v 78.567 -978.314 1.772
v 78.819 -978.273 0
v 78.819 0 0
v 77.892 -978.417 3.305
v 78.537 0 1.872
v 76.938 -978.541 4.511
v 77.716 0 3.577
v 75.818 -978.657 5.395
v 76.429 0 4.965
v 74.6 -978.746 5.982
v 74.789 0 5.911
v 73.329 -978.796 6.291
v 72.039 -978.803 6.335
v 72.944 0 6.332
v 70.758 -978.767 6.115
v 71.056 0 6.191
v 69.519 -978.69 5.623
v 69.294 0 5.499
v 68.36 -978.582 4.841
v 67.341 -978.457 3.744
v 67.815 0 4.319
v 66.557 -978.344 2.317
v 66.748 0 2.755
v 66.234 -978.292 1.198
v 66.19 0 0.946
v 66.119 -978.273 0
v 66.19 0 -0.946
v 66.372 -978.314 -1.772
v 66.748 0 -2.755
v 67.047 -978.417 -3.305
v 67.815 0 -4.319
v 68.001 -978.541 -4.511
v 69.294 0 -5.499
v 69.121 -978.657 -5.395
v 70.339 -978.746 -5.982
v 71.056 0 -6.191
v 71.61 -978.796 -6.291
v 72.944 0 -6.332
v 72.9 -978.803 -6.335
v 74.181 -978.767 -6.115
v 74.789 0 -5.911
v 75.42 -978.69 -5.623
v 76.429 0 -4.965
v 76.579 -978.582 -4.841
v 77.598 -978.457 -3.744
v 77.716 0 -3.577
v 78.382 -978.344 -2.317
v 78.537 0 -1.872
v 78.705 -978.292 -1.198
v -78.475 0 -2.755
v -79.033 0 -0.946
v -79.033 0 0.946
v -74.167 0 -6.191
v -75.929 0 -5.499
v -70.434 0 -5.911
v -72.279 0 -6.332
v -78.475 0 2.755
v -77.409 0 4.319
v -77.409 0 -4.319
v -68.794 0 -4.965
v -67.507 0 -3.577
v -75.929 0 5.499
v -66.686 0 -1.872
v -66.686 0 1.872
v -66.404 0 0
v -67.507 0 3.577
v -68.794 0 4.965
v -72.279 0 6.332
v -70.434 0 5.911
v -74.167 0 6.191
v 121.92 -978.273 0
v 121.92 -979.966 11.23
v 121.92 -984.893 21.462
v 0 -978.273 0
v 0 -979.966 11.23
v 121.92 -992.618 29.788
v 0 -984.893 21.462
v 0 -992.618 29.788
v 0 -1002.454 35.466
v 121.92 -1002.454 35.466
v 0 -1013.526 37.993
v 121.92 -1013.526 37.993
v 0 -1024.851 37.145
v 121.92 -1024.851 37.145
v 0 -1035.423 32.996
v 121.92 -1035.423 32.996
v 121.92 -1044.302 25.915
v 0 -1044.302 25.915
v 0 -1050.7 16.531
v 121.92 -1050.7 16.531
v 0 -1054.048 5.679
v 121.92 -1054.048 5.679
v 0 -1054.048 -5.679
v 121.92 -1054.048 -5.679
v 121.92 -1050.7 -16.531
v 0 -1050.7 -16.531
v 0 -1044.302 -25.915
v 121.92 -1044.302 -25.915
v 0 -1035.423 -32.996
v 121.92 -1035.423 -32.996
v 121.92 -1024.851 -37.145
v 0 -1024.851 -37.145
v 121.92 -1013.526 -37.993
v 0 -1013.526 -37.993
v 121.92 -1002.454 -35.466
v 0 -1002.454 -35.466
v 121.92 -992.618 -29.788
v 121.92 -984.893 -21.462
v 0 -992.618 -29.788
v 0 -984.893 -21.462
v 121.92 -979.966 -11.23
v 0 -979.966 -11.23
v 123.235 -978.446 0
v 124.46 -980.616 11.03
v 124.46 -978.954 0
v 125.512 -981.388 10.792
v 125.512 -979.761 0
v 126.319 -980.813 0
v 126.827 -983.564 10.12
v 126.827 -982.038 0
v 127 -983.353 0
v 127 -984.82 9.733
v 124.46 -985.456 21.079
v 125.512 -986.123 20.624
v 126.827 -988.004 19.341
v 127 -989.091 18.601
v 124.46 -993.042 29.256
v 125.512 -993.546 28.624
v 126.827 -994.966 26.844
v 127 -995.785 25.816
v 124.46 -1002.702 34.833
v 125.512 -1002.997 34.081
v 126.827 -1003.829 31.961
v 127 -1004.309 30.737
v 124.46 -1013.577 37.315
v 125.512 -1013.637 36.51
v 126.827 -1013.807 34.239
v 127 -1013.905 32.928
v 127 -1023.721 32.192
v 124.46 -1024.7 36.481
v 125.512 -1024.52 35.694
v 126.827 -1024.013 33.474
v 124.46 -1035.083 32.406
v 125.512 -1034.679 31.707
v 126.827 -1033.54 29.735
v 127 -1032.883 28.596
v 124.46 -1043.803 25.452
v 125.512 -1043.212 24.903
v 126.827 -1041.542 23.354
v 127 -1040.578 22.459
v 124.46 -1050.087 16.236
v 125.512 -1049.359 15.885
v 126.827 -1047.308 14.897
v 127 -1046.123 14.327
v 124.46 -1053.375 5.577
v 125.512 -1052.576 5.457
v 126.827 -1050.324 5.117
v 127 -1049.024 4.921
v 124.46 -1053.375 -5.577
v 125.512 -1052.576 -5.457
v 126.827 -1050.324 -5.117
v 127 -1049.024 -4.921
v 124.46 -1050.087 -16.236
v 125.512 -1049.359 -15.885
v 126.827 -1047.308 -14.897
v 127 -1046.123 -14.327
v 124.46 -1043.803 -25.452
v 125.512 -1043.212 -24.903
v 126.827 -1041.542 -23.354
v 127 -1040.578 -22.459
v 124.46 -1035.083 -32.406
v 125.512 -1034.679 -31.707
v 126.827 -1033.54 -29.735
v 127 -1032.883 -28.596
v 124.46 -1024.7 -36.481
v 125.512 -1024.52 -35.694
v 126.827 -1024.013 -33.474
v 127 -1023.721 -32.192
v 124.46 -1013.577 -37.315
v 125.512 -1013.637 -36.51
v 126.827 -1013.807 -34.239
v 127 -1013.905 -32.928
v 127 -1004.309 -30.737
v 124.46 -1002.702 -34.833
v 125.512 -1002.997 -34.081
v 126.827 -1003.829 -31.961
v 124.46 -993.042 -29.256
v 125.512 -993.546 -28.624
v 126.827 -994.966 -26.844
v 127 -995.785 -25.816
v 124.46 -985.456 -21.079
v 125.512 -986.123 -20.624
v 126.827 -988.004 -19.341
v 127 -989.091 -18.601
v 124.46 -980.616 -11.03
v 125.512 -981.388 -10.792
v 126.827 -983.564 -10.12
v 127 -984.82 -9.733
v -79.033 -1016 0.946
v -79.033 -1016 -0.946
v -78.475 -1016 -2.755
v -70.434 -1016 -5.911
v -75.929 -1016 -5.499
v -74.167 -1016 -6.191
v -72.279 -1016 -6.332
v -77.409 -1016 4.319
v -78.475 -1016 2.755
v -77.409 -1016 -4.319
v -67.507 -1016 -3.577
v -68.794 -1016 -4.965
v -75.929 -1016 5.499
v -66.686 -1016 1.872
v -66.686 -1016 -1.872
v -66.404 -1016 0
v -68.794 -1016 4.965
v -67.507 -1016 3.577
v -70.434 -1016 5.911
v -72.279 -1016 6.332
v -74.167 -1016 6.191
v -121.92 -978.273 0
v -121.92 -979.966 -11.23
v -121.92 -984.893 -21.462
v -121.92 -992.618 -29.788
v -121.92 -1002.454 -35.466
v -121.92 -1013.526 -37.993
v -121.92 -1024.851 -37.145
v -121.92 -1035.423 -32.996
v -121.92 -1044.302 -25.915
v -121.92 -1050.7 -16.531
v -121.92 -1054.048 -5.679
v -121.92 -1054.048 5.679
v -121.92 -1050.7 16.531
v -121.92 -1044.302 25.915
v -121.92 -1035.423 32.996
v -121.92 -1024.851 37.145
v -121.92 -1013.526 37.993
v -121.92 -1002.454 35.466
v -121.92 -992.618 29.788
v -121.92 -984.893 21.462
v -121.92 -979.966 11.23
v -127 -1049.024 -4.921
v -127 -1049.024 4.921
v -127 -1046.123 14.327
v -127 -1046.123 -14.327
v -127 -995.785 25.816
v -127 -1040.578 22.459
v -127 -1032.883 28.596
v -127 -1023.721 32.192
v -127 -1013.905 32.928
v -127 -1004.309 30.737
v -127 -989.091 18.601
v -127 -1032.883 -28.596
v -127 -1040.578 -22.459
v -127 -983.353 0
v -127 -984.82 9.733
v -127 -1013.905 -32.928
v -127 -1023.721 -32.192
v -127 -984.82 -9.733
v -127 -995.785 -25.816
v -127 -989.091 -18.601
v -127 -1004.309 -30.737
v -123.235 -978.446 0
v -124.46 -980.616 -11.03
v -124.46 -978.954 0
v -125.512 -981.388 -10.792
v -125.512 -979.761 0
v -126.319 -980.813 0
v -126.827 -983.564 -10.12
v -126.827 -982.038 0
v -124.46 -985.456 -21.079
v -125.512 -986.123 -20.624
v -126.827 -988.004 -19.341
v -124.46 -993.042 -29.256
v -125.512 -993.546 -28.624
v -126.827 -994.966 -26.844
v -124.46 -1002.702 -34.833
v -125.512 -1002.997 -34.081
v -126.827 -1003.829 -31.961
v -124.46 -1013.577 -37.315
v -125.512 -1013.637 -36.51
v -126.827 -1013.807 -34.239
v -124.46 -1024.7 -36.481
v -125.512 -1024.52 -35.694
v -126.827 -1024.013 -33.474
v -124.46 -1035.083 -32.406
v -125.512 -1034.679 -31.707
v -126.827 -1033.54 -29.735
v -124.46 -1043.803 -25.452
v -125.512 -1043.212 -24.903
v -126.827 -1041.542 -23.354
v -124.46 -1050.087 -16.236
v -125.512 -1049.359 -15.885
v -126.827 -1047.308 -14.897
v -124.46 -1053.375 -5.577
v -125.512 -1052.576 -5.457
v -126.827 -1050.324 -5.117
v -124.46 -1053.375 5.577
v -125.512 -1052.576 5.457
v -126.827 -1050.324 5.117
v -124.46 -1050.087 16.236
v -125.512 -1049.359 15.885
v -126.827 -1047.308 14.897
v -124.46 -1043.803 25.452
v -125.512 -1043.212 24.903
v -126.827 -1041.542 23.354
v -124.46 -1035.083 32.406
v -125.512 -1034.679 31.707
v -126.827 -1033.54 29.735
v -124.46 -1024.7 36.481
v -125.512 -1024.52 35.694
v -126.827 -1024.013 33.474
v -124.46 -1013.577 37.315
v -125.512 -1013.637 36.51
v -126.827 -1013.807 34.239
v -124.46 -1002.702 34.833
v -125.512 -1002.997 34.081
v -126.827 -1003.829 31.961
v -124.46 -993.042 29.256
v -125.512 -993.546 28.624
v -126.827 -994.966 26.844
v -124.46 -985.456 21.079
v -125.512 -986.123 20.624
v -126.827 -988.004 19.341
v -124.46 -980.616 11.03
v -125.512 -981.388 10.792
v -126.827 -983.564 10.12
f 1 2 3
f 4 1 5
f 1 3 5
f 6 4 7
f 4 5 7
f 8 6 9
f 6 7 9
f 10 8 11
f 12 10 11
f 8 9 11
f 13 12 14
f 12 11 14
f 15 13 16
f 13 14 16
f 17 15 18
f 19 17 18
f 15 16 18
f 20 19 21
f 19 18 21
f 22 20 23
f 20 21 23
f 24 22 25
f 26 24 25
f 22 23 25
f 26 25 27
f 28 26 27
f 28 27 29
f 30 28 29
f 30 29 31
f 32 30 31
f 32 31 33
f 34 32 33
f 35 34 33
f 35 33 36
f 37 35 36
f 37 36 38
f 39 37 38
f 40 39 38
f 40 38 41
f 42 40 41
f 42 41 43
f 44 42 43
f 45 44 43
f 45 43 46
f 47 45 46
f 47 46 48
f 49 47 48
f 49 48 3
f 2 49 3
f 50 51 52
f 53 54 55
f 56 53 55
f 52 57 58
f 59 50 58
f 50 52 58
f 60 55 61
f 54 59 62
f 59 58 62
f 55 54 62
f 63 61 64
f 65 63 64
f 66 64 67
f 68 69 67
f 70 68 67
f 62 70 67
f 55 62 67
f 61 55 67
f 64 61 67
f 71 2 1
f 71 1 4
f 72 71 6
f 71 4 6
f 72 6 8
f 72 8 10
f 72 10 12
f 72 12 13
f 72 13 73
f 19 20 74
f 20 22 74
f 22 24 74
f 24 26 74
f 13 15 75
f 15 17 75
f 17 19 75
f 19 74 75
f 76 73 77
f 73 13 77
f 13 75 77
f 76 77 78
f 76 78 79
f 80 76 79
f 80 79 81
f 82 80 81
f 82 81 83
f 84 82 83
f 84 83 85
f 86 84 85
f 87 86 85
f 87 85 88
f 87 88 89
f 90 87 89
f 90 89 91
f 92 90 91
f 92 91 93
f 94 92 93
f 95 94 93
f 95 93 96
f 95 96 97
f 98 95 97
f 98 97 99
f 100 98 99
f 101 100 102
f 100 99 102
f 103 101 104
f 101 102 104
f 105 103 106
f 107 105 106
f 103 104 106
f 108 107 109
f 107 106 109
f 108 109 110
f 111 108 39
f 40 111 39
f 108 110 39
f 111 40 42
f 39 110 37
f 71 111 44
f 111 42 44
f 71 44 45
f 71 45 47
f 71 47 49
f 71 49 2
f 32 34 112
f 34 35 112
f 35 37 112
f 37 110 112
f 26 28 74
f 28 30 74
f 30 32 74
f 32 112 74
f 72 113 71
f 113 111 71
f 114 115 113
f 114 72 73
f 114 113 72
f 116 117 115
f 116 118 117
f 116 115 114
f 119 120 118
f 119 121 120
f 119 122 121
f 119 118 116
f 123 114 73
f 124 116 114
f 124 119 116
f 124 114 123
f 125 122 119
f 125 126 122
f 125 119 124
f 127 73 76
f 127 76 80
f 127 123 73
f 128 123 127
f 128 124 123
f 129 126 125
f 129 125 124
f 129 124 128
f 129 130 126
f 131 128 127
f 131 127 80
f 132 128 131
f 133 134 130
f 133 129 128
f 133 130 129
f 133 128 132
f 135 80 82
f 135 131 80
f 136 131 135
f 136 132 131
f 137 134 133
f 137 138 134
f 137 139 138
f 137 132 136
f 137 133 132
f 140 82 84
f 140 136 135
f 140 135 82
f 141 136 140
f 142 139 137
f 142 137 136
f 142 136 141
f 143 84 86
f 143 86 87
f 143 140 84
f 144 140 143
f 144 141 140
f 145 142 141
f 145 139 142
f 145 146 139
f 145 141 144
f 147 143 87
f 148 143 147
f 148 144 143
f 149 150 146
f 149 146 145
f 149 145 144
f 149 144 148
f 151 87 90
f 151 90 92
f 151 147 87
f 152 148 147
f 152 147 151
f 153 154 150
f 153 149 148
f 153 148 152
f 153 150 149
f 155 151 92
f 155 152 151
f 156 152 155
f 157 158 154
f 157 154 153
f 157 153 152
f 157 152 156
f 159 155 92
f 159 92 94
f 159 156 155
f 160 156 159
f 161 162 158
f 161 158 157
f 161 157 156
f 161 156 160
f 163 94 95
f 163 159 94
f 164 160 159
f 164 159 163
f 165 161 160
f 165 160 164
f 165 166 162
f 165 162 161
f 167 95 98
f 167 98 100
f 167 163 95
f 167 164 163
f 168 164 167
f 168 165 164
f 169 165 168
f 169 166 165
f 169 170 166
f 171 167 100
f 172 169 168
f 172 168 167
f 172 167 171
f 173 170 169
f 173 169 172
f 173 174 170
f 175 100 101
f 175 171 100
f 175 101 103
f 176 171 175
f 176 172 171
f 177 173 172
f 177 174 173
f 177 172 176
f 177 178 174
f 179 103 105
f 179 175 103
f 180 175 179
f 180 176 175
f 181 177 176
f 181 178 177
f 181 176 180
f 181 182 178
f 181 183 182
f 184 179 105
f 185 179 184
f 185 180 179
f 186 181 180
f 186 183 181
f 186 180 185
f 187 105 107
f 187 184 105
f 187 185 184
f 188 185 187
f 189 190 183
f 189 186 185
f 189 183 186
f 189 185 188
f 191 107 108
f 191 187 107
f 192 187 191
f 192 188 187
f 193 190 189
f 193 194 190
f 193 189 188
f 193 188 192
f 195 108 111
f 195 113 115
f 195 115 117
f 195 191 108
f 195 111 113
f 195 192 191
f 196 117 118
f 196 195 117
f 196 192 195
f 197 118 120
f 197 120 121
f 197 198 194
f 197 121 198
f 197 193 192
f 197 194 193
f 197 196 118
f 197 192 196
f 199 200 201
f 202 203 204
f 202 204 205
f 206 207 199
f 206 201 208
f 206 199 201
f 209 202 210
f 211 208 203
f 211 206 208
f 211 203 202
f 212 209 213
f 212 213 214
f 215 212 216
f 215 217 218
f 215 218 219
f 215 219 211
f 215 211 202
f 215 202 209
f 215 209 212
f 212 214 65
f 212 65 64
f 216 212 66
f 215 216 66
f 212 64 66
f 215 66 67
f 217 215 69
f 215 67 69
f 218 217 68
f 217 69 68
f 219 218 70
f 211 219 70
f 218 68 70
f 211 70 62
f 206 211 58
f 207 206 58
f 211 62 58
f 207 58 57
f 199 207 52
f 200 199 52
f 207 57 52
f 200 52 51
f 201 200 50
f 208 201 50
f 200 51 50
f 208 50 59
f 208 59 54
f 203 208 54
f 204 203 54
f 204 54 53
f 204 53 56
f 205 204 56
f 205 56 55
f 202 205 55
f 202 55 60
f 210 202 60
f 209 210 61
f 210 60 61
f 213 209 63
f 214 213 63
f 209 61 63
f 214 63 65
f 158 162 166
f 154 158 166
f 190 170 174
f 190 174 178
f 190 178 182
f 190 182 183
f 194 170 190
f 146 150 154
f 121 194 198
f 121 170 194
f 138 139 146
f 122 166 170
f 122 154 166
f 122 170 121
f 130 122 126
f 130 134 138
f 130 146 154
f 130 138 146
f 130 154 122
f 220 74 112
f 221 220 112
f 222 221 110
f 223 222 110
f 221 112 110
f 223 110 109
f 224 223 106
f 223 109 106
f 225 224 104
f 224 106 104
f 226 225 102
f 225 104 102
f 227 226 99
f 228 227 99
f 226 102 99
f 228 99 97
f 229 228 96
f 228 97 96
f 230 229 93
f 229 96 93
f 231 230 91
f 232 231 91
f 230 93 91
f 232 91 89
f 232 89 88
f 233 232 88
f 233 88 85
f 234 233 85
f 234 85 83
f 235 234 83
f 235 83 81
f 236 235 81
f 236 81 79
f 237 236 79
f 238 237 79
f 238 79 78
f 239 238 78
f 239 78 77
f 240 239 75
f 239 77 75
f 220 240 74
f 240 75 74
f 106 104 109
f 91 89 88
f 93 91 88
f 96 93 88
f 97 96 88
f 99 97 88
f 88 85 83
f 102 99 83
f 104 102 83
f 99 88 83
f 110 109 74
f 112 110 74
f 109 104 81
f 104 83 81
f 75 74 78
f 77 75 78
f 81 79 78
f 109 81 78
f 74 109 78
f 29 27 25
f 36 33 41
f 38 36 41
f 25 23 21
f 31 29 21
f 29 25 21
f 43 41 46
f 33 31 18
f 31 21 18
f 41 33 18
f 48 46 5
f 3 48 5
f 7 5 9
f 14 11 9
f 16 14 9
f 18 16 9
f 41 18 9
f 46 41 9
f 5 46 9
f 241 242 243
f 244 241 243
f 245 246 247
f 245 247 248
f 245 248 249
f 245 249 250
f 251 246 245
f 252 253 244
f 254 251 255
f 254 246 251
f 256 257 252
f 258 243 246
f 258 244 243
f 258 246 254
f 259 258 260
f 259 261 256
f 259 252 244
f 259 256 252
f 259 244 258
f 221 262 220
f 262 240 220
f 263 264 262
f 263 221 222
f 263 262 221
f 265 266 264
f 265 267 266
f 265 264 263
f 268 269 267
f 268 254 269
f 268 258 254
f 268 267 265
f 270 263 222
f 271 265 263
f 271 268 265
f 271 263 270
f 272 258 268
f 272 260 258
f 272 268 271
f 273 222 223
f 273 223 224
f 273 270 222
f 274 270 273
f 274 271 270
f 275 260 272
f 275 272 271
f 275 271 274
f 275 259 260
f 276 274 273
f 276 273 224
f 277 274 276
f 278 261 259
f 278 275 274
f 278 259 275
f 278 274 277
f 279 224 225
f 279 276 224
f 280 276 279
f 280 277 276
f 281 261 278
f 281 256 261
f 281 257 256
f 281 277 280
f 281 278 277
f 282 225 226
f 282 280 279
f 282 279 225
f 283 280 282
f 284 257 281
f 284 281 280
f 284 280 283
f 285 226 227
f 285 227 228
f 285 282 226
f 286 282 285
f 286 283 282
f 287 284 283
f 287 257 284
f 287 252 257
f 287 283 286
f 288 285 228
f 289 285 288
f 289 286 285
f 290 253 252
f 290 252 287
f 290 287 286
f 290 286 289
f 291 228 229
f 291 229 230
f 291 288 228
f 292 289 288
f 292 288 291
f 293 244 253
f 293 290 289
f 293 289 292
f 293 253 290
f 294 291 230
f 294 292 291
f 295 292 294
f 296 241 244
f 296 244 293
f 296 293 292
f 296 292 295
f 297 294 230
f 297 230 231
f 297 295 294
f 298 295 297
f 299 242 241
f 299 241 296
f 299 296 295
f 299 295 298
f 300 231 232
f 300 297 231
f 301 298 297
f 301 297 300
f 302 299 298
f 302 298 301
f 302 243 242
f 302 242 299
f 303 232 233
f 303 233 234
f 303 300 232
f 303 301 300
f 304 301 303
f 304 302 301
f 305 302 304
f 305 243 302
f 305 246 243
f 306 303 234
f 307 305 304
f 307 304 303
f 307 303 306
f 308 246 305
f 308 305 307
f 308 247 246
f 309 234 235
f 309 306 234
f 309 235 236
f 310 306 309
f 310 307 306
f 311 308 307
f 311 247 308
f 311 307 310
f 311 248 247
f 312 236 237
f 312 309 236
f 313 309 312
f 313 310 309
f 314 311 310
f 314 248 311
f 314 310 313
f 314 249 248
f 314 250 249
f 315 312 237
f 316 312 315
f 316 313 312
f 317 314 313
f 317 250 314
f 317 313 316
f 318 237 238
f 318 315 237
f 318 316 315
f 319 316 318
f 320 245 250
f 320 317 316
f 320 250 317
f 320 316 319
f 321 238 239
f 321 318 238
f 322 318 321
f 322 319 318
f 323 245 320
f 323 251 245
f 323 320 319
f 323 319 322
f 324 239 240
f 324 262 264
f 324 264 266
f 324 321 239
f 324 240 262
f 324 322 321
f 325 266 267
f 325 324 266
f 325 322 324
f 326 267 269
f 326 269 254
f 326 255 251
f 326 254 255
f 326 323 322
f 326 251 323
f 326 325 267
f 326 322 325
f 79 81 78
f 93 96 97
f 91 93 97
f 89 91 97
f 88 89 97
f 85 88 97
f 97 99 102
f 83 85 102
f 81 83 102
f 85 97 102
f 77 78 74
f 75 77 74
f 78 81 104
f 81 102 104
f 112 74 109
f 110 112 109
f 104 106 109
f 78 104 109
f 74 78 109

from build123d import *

# Parameters (mm, degrees)
F0_R      = 6.35
F1_DEPTH  = 1016
F2_R      = 38.1
F3_DEPTH  = 127
F3_FACE_R = 38.1
F4_DEPTH  = 127
F5_R      = 5.08
F6_R      = 5.08


with BuildPart() as f1:
    # F0 (on Front) → F1 (new body)
    with BuildSketch(Plane.XZ):
        with Locations((72.469467, 0)):
            Circle(F0_R)
        with Locations((-72.753659, 0)):
            Circle(F0_R)
    extrude(amount=F1_DEPTH)

    # F2 (on Right) → F3 (join)
    with BuildSketch(Plane.YZ):
        with Locations((-1016.373051, 0)):
            Circle(F2_R)
    extrude(amount=F3_DEPTH)

    # F6
    f6_edges = [f1.edges().sort_by_distance(p)[0] for p in [
        (127, -1054.473051, 0),
    ]]
    fillet(f6_edges, radius=F6_R)


with BuildPart() as f4:
    # F3_face (on face) → F4 (new body)
    with BuildSketch(Plane(origin=(0, -1016.373051, 0), x_dir=(0, 1, 0), z_dir=(-1, 0, 0))):
        Circle(F3_FACE_R)
    extrude(amount=F4_DEPTH)

    # F5
    f5_edges = [f4.edges().sort_by_distance(p)[0] for p in [
        (-127, -1054.473051, 0),
    ]]
    fillet(f5_edges, radius=F5_R)


solid = Compound([f1.part, f4.part])
